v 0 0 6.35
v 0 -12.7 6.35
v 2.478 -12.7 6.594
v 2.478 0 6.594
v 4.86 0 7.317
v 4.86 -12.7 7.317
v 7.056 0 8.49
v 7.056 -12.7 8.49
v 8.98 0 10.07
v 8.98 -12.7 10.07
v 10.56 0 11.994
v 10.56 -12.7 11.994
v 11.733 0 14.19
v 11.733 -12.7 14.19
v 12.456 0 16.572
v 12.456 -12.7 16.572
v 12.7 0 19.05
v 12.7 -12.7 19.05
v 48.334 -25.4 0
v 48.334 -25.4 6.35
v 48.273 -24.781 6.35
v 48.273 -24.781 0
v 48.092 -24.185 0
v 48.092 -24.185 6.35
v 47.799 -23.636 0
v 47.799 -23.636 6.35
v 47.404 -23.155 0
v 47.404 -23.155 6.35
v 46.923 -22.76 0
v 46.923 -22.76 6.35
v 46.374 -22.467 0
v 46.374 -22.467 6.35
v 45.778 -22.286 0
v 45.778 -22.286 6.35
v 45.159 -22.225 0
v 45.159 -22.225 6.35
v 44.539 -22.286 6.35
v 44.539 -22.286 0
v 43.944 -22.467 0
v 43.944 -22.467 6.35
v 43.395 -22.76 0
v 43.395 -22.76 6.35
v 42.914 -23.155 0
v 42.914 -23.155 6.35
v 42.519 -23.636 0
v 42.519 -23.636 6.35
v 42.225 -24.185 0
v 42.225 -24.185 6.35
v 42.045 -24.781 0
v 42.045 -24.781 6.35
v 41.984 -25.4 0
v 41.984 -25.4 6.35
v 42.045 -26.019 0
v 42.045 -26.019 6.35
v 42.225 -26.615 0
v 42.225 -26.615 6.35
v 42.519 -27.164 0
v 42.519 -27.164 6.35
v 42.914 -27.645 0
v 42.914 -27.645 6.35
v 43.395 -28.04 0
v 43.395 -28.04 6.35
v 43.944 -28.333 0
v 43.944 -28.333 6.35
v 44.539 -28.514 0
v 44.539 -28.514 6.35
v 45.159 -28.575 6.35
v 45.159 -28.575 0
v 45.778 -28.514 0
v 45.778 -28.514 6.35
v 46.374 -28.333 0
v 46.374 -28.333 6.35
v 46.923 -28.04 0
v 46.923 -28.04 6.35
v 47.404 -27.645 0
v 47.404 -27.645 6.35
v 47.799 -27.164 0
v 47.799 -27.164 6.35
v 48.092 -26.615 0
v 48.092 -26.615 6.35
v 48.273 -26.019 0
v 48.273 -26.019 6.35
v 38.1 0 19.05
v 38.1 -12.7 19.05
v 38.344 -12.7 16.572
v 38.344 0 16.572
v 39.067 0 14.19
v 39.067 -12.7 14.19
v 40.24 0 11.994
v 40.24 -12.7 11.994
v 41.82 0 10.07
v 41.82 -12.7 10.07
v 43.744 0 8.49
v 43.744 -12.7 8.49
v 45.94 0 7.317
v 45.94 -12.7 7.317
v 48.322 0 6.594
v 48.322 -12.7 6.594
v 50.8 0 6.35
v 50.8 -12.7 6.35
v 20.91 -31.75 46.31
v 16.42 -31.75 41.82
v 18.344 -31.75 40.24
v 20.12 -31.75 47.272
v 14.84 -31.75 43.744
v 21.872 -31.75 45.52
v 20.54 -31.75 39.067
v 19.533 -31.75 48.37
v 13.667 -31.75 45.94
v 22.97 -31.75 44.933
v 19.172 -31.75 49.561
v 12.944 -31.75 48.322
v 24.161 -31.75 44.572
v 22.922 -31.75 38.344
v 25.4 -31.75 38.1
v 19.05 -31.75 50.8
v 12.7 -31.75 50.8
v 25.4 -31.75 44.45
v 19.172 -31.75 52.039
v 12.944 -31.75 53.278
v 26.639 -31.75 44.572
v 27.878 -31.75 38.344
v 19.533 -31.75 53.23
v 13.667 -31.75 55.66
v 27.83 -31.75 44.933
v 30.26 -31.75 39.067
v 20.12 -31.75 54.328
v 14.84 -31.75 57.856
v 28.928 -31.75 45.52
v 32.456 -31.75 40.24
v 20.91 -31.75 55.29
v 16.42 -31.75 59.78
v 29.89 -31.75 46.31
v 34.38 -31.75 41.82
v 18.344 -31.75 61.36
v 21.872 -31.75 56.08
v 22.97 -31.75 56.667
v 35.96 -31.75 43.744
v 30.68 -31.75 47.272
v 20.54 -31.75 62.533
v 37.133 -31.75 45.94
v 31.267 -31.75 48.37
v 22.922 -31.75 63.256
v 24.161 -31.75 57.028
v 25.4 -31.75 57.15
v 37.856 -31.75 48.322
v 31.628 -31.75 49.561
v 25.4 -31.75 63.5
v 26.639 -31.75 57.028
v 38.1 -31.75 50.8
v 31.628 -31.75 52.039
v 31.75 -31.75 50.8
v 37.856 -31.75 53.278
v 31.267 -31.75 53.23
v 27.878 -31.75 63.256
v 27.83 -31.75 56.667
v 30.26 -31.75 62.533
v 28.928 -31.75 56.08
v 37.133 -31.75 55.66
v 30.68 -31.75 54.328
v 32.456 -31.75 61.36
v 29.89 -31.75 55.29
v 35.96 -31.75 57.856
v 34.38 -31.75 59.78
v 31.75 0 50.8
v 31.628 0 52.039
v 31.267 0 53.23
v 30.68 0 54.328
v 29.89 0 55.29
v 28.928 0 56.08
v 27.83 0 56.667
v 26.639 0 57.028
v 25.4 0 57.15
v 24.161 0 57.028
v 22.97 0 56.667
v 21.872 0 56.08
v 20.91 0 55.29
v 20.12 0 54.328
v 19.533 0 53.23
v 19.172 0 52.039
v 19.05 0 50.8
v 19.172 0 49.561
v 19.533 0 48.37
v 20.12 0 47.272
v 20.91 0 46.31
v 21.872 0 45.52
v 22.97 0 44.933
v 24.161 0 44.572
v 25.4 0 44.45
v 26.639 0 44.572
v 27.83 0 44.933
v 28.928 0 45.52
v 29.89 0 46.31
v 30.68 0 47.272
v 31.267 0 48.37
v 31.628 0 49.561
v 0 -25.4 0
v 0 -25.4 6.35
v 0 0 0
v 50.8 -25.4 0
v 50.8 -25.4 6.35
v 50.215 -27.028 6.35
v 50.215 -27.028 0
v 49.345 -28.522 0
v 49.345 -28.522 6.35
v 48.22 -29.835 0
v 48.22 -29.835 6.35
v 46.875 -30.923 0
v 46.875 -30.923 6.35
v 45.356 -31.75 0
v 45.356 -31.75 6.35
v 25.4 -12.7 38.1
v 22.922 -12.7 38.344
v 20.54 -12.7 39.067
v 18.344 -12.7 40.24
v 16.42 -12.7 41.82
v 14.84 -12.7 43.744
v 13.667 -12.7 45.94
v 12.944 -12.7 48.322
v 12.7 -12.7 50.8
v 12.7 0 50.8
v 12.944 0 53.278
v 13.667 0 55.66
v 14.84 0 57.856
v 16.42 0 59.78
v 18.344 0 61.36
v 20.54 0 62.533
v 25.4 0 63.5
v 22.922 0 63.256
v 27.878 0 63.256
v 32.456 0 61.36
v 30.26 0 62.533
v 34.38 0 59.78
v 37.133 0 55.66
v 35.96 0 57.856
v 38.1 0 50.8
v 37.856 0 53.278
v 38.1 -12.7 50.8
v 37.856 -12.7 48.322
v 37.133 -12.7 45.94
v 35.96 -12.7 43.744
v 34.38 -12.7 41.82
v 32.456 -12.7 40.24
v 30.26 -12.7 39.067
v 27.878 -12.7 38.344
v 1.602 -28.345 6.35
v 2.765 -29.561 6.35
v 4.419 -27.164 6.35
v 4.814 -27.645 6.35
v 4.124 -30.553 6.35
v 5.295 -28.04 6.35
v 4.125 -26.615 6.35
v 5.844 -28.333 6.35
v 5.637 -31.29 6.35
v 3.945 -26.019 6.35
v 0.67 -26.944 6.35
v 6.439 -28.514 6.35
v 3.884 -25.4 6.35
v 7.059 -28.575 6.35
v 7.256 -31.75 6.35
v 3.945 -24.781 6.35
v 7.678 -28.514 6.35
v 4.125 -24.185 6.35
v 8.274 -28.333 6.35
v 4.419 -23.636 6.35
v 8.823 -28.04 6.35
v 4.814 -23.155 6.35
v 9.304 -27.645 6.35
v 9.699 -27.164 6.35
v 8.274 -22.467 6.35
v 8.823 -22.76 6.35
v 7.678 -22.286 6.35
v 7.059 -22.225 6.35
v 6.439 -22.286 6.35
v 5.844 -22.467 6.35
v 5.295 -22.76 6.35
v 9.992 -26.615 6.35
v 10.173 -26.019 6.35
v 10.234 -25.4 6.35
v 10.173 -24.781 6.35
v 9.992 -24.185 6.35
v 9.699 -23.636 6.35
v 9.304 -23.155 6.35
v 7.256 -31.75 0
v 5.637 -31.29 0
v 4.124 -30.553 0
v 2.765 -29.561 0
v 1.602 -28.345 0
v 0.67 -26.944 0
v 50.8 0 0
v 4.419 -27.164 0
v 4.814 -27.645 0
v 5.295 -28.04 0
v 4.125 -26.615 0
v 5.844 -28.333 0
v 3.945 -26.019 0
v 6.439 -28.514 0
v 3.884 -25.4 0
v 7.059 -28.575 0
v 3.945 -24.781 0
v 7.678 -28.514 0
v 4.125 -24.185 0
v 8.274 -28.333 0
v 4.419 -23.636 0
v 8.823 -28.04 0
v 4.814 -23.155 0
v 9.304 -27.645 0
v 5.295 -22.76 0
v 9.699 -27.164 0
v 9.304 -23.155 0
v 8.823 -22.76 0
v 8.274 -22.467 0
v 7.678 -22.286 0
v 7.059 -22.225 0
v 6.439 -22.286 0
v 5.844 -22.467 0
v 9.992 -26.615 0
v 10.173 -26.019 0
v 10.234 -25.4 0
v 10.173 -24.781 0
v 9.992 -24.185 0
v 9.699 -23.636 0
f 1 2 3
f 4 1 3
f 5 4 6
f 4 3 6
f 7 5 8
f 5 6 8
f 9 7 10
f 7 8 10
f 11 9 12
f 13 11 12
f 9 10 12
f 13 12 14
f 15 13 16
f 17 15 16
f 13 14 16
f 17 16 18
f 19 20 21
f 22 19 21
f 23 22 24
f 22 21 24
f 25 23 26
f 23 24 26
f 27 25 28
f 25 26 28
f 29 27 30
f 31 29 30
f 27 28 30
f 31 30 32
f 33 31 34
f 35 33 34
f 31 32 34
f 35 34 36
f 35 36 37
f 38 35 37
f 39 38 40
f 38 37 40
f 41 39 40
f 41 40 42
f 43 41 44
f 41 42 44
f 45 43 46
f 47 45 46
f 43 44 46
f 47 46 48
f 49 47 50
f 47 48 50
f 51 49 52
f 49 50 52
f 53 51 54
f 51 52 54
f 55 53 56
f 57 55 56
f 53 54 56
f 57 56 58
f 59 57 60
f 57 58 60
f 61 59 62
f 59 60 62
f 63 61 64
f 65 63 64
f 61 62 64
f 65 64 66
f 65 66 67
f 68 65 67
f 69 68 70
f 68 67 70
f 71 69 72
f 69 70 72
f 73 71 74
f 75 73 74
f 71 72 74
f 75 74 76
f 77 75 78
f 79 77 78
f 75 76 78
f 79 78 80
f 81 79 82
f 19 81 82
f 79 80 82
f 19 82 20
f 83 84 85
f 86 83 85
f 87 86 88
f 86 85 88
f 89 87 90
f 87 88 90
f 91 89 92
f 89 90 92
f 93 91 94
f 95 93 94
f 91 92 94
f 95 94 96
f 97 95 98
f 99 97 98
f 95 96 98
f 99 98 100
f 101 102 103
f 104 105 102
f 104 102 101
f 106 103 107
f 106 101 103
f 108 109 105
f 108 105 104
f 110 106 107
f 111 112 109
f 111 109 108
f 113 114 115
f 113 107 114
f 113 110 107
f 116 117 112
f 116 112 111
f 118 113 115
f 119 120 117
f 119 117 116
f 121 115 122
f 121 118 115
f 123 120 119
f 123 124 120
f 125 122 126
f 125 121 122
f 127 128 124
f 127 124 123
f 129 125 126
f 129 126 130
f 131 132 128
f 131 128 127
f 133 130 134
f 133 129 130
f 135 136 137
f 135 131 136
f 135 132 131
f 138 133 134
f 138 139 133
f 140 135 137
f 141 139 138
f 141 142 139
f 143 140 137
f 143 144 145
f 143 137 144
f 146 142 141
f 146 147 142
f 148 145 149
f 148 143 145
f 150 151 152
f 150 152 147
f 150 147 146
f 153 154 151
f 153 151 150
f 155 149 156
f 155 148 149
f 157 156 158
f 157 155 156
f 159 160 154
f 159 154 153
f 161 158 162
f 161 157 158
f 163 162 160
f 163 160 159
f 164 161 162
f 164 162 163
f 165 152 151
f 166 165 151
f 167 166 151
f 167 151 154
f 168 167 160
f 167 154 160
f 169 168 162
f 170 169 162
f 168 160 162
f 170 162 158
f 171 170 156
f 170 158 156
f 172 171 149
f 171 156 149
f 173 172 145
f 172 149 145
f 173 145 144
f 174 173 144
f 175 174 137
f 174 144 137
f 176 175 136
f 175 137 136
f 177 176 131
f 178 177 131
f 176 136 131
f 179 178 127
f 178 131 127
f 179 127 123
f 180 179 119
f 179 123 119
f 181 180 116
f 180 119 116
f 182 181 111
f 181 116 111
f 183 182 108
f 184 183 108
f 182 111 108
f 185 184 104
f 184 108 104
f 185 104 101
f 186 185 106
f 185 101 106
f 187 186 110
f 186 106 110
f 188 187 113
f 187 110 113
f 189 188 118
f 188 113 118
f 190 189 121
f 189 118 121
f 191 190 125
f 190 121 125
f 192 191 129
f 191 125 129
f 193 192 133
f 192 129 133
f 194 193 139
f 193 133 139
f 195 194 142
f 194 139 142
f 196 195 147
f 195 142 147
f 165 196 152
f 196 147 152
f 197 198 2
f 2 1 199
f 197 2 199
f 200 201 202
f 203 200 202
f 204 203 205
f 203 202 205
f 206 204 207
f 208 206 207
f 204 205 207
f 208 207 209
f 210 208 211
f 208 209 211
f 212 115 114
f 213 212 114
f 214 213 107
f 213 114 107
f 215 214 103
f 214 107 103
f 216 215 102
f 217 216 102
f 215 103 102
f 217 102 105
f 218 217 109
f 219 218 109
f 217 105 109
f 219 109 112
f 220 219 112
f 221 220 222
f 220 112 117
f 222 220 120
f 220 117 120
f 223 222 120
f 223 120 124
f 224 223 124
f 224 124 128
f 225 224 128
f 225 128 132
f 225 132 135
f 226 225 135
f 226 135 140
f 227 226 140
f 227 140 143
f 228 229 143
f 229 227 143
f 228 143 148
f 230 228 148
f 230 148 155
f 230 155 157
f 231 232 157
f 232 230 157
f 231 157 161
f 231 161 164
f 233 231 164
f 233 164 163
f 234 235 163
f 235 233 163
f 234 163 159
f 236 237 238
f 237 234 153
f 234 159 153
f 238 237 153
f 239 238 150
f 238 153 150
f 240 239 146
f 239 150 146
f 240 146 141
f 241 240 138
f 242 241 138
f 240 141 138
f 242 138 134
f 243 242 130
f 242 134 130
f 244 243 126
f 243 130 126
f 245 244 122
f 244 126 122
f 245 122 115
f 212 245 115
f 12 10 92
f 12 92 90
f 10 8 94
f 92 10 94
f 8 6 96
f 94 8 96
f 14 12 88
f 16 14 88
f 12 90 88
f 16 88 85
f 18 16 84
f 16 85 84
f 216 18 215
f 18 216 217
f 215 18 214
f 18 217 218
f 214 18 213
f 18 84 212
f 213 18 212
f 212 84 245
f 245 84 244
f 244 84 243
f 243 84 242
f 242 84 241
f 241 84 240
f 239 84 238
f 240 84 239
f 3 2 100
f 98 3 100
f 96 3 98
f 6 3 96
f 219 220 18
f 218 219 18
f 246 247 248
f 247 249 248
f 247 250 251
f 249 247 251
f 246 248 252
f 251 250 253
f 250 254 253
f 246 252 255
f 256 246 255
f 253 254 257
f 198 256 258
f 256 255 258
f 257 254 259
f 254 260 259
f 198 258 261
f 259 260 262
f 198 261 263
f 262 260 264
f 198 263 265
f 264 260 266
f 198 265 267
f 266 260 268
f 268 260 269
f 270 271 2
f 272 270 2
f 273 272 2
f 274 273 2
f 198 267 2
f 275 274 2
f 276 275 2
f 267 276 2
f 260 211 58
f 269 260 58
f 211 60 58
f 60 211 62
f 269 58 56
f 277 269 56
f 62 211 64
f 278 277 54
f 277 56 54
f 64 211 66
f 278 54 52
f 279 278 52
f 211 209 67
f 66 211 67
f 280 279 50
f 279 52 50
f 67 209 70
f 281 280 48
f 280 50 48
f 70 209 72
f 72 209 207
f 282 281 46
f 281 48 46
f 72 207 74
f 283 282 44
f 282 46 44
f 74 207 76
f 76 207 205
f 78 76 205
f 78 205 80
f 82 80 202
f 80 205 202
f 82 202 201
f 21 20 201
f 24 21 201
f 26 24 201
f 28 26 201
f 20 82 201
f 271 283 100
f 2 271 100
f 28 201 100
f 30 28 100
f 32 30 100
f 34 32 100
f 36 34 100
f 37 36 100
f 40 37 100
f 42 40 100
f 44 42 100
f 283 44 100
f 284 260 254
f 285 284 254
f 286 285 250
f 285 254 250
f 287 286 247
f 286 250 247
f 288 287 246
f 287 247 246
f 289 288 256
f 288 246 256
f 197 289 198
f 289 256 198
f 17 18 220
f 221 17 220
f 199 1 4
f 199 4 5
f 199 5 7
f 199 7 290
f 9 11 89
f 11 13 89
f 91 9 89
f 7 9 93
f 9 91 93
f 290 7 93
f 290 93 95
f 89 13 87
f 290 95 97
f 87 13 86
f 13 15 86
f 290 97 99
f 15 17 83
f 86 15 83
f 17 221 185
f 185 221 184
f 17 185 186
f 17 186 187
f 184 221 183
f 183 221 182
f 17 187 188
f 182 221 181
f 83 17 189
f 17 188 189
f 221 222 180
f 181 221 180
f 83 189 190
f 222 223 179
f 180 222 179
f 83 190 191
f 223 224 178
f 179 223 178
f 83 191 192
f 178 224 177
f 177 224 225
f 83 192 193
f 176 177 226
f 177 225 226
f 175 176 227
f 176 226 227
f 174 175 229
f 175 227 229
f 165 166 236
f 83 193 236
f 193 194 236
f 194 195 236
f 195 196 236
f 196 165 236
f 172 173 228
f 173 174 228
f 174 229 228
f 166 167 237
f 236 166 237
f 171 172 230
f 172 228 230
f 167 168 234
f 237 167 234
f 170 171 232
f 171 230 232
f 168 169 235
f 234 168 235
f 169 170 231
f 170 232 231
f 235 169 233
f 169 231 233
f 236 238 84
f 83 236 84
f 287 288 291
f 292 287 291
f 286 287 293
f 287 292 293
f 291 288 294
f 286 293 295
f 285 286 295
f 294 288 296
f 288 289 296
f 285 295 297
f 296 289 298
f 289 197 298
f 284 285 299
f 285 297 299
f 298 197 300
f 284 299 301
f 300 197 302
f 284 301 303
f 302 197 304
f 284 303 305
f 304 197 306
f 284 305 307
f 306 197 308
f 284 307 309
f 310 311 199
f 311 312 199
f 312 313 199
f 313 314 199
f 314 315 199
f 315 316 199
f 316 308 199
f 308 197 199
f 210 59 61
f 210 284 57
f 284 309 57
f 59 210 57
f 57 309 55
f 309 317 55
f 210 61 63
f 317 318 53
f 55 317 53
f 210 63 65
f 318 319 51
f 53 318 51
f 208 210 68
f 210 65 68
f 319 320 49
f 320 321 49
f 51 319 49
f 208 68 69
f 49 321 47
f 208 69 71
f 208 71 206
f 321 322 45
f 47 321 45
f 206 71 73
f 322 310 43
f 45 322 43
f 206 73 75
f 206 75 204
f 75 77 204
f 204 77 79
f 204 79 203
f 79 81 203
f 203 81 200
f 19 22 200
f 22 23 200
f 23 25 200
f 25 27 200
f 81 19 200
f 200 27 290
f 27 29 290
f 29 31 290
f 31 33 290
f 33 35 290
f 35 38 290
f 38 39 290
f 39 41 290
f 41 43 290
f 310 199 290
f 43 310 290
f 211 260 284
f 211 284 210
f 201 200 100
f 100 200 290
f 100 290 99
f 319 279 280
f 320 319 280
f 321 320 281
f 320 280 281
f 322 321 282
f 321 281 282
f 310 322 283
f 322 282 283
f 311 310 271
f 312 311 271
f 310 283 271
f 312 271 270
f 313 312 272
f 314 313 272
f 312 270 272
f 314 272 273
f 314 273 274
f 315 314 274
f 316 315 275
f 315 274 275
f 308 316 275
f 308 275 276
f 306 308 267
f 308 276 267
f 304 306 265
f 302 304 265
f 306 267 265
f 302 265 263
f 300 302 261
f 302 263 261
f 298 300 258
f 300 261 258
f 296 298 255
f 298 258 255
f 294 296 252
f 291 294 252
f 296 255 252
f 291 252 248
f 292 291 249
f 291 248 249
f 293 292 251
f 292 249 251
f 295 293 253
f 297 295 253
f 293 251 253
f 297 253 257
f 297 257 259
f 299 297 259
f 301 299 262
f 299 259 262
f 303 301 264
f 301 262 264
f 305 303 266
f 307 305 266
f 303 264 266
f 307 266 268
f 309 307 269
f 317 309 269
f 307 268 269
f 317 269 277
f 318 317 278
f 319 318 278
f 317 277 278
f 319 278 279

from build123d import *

# Parameters (mm, degrees)
F1_DEPTH  = 31.75
F2_W      = 19.05
F2_H      = 31.75
F3_DEPTH  = 57.15
F5_DEPTH  = 19.05
F7_DEPTH  = 25.4
F8_R      = 6.35
F9_DEPTH  = 31.75
F11_DEPTH = 6.35
F12_R     = 3.175
F13_DEPTH = 6.35
F14_DEPTH = 6.35


with BuildPart() as f1:
    # F0 (on Front) → F1 (new body)
    with BuildSketch(Plane.XZ):
        Polygon((0, 6.35), (0, 0), (50.8, 0), (50.8, 6.35), (50.8, 63.5), (0, 63.5), align=None)
    extrude(amount=F1_DEPTH)

    # F2 (on face) → F3 (cut)
    with BuildSketch(Plane.YZ.offset(50.8)):
        with Locations((-22.225, 22.225)):
            Rectangle(F2_W, F2_H)
    extrude(amount=-F3_DEPTH, mode=Mode.SUBTRACT)

    # F4 (on face) → F5 (cut)
    with BuildSketch(Plane.XZ.offset(31.75)):
        with BuildLine():
            ThreePointArc((25.4, 63.5), (34.3802561211, 59.7802561211), (38.1, 50.8))
            ThreePointArc((38.1, 50.8), (34.3802561211, 41.8197438789), (25.4, 38.1))
            Line((25.4, 38.1), (50.8, 38.1))
            Line((50.8, 38.1), (50.8, 63.5))
            Line((50.8, 63.5), (25.4, 63.5))
        make_face()
        with BuildLine():
            ThreePointArc((25.4, 38.1), (12.7, 50.8), (25.4, 63.5))
            Line((25.4, 63.5), (0, 63.5))
            Line((0, 63.5), (0, 38.1))
            Line((0, 38.1), (25.4, 38.1))
        make_face()
    extrude(amount=-F5_DEPTH, mode=Mode.SUBTRACT)

    # F6 (on face) → F7 (cut)
    with BuildSketch(Plane.XZ.offset(12.7)):
        with BuildLine():
            Line((0, 63.5), (0, 6.35))
            ThreePointArc((0, 6.35), (8.9802561211, 10.0697438789), (12.7, 19.05))
            Line((12.7, 19.05), (12.7, 50.8))
            ThreePointArc((12.7, 50.8), (16.4197438789, 59.7802561211), (25.4, 63.5))
            Line((25.4, 63.5), (0, 63.5))
        make_face()
        with BuildLine():
            ThreePointArc((38.1, 19.05), (41.8197438789, 10.0697438789), (50.8, 6.35))
            Line((50.8, 6.35), (50.8, 63.5))
            Line((50.8, 63.5), (25.4, 63.5))
            ThreePointArc((25.4, 63.5), (34.3802561211, 59.7802561211), (38.1, 50.8))
            Line((38.1, 50.8), (38.1, 19.05))
        make_face()
    extrude(amount=-F7_DEPTH, mode=Mode.SUBTRACT)

    # F8 (on face) → F9 (cut)
    with BuildSketch(Plane.XZ.offset(31.75)):
        with Locations((25.4, 50.8)):
            Circle(F8_R)
    extrude(amount=-F9_DEPTH, mode=Mode.SUBTRACT)

    # F10 (on face) → F11 (cut)
    with BuildSketch(Plane.XY.offset(6.35)):
        with BuildLine():
            Line((0, -25.4), (0, -31.75))
            Line((0, -31.75), (7.2559140616, -31.75))
            ThreePointArc((7.2559140616, -31.75), (2.7651010981, -29.5609540937), (0, -25.4))
        make_face()
        with BuildLine():
            ThreePointArc((50.8, -25.4), (48.8122601511, -29.2045447704), (45.3559140616, -31.75))
            Line((45.3559140616, -31.75), (50.8, -31.75))
            Line((50.8, -31.75), (50.8, -25.4))
        make_face()
    extrude(amount=-F11_DEPTH, mode=Mode.SUBTRACT)

    # F12 (on face) → F13 (cut)
    with BuildSketch(Plane.XY.offset(6.35)):
        with Locations((7.0587542899, -25.4)):
            Circle(F12_R)
        with Locations((45.1587542899, -25.4)):
            Circle(F12_R)
    extrude(amount=-F13_DEPTH, mode=Mode.SUBTRACT)

    # F12 (on face) → F14 (cut)
    with BuildSketch(Plane.XY.offset(6.35)):
        with Locations((7.0587542899, -25.4)):
            Circle(F12_R)
        with Locations((45.1587542899, -25.4)):
            Circle(F12_R)
    extrude(amount=-F14_DEPTH, mode=Mode.SUBTRACT)


solid = f1.part
